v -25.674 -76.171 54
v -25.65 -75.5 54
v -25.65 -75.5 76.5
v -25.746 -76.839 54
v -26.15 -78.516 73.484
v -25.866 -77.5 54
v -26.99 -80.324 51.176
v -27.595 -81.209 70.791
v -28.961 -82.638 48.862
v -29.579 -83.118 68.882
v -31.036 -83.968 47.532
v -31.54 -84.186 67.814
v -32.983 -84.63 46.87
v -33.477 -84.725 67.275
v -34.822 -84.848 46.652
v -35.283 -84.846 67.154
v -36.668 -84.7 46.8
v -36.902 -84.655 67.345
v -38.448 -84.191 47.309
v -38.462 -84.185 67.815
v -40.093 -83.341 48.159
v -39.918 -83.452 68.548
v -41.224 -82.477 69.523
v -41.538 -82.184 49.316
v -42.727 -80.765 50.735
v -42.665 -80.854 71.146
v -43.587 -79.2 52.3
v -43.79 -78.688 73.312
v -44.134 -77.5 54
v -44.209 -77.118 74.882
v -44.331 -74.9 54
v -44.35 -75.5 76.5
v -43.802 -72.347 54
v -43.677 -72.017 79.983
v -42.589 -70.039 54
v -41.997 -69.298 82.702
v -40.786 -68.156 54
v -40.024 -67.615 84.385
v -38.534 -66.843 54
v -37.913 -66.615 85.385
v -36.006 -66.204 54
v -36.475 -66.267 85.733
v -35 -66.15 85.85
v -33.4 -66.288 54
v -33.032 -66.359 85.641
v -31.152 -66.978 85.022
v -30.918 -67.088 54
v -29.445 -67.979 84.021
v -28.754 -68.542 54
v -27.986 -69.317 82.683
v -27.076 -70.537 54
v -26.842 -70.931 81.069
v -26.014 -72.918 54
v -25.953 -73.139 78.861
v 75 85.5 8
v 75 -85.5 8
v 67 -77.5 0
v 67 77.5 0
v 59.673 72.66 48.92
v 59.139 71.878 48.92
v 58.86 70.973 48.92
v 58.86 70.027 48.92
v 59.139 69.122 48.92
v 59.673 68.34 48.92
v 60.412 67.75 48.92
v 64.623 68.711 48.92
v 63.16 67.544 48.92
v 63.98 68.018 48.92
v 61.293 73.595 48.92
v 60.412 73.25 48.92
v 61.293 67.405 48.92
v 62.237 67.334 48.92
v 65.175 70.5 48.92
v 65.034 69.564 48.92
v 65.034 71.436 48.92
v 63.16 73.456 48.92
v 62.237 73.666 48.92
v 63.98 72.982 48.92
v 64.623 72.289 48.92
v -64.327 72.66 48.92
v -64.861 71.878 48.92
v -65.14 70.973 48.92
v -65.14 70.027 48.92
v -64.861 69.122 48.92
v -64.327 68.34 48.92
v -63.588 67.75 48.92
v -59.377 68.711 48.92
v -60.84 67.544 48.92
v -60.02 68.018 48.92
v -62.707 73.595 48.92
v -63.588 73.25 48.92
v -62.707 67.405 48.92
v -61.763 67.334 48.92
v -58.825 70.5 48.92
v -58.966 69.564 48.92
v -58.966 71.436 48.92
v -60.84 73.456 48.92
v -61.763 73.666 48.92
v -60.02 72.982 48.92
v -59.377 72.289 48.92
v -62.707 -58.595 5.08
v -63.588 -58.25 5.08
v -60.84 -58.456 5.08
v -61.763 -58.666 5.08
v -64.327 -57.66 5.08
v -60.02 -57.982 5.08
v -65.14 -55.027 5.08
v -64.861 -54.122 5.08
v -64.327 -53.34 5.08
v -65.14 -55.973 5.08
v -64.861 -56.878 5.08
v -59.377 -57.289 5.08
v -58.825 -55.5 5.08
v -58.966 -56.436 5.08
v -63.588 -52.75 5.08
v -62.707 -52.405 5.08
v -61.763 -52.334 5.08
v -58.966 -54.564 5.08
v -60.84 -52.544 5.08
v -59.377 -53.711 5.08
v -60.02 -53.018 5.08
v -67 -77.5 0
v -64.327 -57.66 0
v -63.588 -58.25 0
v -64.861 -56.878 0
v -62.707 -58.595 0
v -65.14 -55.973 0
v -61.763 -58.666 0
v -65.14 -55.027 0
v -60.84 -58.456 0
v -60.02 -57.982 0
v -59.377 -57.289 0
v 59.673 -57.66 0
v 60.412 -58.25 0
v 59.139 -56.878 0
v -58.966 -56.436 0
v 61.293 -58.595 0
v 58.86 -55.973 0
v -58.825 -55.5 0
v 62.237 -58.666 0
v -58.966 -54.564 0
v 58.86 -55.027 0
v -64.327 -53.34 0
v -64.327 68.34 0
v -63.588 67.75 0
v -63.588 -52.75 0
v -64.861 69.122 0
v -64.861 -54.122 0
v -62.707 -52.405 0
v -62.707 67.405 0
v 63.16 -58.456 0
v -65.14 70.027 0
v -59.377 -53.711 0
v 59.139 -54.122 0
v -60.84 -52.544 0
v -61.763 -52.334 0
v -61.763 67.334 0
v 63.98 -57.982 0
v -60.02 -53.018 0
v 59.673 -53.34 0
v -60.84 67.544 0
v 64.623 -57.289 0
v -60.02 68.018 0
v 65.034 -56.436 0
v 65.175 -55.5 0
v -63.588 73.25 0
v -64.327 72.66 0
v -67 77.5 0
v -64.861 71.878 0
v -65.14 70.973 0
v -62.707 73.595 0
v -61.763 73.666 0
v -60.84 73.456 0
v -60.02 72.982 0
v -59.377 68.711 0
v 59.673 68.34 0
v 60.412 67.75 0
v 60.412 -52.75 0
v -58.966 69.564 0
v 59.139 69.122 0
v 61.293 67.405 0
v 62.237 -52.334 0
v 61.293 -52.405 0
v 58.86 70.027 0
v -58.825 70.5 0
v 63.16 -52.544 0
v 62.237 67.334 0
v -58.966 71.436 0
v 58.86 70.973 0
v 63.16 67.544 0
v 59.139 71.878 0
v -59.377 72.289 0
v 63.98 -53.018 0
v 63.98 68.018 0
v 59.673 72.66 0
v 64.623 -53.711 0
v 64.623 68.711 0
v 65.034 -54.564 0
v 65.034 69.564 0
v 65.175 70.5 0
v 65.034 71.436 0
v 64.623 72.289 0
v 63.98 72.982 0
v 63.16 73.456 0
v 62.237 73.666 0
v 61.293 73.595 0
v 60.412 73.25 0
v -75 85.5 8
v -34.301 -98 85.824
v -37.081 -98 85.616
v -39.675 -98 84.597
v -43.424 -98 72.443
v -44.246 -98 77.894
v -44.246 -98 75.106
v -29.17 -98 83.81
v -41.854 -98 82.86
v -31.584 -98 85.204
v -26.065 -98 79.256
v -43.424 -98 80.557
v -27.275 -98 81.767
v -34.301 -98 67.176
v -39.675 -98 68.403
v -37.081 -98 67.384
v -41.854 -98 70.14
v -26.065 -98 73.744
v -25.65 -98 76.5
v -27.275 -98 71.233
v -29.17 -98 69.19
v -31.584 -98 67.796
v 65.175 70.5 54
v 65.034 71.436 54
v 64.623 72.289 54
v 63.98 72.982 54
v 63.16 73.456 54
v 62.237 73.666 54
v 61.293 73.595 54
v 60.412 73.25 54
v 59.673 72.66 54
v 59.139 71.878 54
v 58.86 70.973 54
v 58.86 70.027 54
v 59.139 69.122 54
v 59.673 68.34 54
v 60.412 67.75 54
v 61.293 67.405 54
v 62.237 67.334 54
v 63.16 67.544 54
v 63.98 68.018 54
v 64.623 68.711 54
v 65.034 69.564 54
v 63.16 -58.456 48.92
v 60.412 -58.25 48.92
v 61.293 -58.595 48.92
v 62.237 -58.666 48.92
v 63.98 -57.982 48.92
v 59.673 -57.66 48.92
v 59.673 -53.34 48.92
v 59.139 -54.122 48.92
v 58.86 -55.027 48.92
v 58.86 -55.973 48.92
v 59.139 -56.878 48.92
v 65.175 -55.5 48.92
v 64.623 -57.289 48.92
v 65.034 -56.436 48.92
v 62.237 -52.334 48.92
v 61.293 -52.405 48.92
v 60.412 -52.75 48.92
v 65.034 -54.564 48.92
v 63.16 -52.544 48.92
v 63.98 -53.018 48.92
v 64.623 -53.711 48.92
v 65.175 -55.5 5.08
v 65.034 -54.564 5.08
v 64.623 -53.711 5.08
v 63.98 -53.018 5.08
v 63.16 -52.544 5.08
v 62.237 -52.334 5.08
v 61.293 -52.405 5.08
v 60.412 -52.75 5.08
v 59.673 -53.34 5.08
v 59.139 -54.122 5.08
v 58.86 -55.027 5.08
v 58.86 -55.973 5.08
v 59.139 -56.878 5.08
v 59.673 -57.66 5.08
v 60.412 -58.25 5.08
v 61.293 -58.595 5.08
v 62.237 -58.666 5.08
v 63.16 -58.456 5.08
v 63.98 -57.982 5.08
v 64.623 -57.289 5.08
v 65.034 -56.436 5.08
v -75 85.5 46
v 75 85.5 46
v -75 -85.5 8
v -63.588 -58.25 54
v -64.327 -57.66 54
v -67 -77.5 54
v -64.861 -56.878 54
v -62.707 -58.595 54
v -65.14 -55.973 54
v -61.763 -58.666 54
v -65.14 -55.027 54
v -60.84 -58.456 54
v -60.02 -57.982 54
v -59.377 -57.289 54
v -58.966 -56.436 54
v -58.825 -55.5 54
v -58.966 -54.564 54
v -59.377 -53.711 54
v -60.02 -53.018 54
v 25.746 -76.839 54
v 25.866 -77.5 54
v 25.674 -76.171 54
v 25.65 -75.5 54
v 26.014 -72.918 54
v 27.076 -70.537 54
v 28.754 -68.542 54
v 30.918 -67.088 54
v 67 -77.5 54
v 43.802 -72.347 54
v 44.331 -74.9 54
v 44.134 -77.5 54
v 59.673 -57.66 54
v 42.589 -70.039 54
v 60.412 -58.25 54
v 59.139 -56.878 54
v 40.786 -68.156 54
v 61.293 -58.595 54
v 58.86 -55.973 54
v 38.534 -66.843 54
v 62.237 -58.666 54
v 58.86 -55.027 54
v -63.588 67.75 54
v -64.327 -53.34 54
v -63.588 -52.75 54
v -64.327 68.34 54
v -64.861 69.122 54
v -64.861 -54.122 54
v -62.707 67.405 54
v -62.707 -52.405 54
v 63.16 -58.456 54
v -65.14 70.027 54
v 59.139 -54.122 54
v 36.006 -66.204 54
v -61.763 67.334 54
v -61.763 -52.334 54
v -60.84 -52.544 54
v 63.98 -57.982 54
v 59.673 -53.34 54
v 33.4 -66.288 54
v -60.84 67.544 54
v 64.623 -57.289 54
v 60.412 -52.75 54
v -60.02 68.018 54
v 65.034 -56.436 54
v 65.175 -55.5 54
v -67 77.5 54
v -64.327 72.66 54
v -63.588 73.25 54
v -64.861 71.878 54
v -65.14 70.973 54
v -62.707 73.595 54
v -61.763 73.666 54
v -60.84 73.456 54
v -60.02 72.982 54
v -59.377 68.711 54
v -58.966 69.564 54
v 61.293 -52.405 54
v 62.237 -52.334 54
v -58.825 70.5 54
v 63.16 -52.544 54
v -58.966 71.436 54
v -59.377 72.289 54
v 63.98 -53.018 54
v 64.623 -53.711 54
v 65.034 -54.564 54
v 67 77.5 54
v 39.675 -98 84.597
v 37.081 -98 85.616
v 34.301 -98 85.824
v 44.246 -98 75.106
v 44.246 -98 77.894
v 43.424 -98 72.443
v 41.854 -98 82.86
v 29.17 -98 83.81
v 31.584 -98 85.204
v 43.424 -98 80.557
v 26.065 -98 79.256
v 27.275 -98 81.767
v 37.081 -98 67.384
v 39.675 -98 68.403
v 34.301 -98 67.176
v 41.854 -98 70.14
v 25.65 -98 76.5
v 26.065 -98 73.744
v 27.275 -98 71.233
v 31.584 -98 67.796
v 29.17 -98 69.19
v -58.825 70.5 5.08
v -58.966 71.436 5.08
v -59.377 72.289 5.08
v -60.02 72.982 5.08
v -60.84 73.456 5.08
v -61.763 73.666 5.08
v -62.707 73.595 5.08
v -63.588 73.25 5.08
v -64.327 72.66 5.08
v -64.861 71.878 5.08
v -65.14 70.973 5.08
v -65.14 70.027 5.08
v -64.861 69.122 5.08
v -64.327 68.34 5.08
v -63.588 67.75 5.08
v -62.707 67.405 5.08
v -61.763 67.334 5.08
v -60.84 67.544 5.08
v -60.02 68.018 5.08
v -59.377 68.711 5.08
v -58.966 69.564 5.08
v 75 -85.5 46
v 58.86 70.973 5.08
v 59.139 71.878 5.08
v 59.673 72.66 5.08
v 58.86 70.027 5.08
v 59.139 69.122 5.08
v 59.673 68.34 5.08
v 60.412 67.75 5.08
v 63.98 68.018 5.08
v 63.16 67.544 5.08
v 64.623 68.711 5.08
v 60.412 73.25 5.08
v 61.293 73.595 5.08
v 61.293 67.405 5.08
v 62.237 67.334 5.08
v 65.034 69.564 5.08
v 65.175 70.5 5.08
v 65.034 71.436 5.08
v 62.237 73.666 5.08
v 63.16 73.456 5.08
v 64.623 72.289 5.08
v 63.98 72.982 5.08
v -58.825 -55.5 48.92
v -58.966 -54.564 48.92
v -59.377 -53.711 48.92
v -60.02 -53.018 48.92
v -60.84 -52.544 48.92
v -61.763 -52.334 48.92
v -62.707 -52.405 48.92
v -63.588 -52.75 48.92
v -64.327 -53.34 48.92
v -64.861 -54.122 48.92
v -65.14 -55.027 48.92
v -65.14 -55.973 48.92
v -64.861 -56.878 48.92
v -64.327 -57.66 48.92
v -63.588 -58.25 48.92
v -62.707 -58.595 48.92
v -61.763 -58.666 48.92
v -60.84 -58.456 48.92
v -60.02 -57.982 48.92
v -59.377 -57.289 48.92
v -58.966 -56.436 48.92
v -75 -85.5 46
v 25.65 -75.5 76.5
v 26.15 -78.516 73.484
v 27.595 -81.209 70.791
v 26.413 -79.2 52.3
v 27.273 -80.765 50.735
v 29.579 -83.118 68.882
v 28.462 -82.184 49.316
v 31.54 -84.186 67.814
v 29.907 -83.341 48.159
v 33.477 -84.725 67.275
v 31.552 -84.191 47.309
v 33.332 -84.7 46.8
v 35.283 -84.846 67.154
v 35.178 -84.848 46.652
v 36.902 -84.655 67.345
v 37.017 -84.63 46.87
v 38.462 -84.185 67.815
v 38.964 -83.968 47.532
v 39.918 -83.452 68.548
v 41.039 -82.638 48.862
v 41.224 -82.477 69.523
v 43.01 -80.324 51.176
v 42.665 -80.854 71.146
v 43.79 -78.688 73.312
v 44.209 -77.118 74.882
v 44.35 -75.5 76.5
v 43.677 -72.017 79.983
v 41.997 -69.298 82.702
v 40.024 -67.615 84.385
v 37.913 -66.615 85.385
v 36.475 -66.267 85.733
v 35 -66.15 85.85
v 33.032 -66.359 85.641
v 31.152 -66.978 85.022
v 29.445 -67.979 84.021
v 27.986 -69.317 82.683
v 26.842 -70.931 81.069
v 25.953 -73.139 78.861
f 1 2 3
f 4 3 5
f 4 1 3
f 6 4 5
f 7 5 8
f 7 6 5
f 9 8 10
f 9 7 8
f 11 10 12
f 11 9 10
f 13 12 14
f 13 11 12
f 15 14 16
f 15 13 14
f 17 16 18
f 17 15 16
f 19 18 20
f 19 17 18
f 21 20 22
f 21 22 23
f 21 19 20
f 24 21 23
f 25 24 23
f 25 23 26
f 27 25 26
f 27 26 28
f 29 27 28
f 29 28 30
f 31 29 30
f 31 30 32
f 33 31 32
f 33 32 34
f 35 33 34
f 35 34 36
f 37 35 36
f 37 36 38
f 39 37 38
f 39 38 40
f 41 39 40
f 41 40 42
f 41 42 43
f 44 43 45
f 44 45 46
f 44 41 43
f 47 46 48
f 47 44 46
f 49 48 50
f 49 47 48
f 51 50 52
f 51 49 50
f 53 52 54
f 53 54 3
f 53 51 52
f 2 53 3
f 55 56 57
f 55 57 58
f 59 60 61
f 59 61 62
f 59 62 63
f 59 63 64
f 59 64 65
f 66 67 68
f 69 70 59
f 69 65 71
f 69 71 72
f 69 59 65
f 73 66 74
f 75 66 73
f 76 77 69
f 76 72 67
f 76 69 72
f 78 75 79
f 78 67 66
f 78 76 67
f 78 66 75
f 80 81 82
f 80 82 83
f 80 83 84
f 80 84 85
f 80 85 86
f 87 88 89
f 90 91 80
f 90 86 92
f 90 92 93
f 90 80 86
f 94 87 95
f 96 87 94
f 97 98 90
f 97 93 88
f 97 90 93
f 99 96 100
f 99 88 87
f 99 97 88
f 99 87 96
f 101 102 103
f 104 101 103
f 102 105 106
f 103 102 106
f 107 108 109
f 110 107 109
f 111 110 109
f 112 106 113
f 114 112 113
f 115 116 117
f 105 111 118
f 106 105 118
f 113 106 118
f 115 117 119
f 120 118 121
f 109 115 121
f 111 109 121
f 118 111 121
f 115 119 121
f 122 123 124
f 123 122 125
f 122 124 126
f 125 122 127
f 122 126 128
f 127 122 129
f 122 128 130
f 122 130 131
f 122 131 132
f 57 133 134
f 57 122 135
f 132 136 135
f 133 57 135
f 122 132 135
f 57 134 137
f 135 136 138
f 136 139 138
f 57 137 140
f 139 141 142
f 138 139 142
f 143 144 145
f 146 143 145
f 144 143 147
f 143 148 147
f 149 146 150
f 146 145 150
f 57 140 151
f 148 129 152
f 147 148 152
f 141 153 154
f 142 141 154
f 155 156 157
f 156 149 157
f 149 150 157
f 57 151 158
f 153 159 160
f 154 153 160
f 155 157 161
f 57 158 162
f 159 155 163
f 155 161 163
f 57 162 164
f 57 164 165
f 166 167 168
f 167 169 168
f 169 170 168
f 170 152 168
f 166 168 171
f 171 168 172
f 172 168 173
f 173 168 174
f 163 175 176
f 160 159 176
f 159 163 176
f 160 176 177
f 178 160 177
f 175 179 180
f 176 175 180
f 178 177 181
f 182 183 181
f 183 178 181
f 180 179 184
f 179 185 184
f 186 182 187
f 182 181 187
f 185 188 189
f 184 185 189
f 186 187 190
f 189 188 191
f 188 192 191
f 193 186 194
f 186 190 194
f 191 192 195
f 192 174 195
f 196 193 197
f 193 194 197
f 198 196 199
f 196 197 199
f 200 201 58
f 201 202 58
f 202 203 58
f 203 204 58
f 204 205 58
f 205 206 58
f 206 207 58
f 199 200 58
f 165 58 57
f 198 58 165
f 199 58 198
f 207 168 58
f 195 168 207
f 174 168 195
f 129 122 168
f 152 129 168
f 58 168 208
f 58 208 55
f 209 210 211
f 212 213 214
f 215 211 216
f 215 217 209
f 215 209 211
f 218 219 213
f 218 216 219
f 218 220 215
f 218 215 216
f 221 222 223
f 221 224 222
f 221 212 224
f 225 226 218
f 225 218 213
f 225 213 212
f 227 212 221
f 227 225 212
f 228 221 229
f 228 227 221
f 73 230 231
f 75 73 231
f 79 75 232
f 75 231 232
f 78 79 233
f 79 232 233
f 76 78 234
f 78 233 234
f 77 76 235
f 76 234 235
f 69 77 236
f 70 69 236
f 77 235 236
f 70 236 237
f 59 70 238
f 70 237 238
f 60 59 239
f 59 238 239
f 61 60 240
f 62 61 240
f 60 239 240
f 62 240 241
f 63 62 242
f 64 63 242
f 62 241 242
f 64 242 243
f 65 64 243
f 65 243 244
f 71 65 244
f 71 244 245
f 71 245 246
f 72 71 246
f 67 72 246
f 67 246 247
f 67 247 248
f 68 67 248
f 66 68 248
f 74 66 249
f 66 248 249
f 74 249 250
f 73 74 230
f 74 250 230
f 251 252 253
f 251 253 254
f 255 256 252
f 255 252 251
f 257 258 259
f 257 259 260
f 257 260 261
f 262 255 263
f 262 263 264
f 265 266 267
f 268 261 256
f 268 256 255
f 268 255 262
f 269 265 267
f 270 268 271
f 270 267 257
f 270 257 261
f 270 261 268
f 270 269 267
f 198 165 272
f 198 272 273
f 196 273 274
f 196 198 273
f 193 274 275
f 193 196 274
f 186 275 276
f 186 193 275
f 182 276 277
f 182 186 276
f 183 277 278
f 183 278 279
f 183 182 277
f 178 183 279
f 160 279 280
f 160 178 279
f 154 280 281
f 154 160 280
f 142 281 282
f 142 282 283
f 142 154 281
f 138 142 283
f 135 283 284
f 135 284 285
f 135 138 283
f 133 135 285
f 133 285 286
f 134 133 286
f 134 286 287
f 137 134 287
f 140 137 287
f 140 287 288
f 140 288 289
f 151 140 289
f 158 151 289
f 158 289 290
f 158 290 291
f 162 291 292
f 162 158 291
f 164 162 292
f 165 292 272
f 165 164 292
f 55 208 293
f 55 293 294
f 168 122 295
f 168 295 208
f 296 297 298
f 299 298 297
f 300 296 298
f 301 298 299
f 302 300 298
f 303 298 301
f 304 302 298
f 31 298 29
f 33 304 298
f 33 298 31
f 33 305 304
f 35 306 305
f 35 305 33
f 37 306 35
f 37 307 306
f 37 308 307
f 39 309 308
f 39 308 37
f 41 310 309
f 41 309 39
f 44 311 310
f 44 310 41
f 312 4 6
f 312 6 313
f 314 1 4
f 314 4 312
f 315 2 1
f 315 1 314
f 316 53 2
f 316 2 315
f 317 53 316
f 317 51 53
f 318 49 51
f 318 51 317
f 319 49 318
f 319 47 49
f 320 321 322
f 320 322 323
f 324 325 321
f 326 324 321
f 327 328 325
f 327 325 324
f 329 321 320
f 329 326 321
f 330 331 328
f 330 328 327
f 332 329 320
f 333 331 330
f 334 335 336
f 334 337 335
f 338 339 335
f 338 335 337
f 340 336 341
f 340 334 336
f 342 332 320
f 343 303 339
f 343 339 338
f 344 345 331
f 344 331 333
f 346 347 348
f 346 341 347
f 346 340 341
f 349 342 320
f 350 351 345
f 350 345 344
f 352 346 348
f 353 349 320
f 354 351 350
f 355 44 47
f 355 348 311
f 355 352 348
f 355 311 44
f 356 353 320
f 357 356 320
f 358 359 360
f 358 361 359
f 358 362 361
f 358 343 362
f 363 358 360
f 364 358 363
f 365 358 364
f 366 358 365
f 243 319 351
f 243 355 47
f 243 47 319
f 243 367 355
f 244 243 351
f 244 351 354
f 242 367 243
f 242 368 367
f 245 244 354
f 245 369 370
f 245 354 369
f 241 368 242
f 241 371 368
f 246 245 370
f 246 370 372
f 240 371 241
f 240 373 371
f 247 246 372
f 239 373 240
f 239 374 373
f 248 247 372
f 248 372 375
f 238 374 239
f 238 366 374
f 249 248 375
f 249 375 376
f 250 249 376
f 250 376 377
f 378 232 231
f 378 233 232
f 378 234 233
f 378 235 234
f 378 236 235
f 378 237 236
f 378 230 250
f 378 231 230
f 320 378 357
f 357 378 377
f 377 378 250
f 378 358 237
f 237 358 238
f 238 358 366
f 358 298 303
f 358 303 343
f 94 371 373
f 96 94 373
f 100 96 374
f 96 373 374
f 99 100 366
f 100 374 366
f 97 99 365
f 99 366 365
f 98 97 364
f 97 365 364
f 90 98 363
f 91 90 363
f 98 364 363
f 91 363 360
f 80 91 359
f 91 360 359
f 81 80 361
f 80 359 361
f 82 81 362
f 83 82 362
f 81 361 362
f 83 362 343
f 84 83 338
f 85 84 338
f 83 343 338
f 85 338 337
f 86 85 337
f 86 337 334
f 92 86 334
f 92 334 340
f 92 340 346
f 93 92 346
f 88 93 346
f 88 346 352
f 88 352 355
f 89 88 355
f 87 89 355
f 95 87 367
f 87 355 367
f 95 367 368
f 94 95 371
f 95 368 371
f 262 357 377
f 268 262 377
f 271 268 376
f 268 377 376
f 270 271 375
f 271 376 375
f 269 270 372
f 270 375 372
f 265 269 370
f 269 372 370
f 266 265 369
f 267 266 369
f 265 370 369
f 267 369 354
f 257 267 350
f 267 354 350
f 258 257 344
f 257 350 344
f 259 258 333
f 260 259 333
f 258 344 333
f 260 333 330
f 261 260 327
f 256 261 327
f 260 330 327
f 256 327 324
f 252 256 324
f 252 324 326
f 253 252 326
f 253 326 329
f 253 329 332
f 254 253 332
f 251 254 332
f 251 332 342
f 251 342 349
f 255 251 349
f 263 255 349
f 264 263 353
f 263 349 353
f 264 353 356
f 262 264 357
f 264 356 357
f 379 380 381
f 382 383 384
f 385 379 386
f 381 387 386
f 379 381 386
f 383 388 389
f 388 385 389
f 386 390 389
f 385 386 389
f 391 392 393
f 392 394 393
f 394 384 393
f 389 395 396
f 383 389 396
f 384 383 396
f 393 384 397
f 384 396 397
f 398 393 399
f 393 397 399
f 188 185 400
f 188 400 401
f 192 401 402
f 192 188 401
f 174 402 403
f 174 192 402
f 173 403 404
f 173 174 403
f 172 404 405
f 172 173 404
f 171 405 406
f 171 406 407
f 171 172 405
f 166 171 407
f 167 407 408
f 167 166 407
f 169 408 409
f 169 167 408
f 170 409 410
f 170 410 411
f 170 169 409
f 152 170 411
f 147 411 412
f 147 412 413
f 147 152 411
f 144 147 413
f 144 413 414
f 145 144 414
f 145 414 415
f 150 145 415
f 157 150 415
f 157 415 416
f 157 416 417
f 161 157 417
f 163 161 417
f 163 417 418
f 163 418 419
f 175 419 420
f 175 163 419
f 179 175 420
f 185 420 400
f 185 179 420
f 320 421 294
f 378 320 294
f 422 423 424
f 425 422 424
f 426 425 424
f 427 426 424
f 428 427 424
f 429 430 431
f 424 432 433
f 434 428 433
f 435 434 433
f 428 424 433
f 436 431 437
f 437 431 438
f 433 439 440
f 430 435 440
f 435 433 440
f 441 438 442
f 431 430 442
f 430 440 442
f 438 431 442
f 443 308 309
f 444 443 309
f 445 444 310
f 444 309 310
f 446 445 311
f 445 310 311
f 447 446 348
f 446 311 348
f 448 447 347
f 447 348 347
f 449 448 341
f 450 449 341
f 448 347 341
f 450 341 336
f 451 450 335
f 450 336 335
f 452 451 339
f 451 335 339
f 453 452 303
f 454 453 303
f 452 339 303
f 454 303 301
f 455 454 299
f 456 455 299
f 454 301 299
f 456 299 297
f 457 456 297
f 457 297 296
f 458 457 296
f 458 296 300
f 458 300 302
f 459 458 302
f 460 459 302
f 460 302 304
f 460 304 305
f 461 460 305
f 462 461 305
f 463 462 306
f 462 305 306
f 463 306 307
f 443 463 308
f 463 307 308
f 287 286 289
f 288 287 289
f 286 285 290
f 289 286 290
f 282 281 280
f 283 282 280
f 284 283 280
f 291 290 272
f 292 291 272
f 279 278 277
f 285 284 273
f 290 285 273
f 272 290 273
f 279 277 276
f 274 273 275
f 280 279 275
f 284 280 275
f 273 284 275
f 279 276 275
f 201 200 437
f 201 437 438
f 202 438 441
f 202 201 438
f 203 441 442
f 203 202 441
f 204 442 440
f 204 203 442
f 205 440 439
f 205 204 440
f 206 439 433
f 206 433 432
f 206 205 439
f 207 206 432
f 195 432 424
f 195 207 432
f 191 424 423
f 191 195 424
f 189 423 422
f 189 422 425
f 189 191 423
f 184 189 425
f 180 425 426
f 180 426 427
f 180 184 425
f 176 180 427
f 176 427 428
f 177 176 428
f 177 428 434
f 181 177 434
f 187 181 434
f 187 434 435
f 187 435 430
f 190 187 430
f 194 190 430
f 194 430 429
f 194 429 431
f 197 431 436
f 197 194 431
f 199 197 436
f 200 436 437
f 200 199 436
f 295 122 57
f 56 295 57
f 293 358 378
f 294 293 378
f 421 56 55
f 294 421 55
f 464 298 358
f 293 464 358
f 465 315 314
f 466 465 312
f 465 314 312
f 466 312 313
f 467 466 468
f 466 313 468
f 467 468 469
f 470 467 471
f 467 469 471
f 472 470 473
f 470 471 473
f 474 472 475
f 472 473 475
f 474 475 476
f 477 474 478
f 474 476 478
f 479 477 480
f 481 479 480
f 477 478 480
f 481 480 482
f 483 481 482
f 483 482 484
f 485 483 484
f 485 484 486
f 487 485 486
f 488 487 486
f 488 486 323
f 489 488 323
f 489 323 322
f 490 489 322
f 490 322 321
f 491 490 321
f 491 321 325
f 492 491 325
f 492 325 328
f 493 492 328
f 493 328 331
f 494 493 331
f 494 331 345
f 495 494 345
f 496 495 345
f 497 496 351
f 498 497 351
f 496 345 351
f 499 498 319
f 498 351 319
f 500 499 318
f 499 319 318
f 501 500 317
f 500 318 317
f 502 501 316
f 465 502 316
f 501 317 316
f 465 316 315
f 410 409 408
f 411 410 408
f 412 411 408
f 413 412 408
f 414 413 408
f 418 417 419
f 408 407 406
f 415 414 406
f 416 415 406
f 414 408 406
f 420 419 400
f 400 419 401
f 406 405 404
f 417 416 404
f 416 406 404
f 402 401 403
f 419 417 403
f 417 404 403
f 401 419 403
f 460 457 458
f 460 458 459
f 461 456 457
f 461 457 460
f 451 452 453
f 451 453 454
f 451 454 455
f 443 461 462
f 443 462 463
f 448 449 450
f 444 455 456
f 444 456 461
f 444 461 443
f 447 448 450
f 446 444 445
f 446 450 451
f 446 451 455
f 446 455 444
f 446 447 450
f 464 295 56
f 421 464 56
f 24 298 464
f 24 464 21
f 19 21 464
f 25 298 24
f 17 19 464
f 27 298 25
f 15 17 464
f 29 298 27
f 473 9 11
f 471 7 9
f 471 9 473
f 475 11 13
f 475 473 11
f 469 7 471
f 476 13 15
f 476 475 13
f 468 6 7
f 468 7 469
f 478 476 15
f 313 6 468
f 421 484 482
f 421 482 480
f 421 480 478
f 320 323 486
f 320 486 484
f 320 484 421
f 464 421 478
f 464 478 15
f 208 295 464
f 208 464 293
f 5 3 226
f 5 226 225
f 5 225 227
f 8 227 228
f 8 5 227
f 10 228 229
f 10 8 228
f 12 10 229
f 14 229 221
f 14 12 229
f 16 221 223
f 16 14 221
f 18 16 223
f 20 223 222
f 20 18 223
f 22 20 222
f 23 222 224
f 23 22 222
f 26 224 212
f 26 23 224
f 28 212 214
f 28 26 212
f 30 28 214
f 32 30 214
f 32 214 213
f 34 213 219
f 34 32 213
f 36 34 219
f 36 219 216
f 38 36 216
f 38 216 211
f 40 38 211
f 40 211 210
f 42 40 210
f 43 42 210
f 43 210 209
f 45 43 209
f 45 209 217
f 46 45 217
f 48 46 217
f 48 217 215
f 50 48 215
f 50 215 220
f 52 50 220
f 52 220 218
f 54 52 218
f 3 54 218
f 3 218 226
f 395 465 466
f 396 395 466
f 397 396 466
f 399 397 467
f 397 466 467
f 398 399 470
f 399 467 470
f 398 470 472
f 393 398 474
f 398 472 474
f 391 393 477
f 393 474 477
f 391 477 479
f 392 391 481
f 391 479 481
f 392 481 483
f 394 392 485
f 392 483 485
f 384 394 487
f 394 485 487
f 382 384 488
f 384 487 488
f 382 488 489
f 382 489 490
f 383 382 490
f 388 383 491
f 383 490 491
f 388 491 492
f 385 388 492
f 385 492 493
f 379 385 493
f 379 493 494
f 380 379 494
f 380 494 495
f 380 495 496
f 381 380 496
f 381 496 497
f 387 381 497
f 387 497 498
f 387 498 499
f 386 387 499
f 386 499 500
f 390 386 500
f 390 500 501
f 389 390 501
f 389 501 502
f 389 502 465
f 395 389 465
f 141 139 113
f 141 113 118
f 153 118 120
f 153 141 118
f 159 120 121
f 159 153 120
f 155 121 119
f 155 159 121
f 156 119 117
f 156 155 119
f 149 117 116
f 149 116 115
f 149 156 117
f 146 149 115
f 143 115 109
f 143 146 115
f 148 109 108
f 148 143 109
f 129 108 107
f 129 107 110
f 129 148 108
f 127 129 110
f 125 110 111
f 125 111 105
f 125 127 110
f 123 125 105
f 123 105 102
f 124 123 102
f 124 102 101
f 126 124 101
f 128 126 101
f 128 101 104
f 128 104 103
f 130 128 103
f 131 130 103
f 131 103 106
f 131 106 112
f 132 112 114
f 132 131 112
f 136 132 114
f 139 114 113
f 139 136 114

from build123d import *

# Parameters (mm, degrees)
SKETCH1_W           = 150
SKETCH1_H           = 171
BOSS_EXTRUDE1_DEPTH = 54
SKETCH2_R           = 3.175
CUT_EXTRUDE1_DEPTH  = 5.08
CHAMFER1_SIZE       = 8
SKETCH5_R           = 9.35


with BuildPart() as part:
    # Sketch1 → Boss-Extrude1 (new body)
    with BuildSketch(Plane.XY):
        Rectangle(SKETCH1_W, SKETCH1_H)
    extrude(amount=BOSS_EXTRUDE1_DEPTH)

    # Sketch2 → Cut-Extrude1 (cut)
    with BuildSketch(Plane.XY.offset(54)):
        with Locations((-62, 70.5)):
            Circle(SKETCH2_R)
        with Locations((62, 70.5)):
            Circle(SKETCH2_R)
        with Locations((62, -55.5)):
            Circle(SKETCH2_R)
        with Locations((-62, -55.5)):
            Circle(SKETCH2_R)
    cut_extrude1 = extrude(amount=-CUT_EXTRUDE1_DEPTH, mode=Mode.SUBTRACT)

    # Mirror1: Cut-Extrude1 across plane
    add(cut_extrude1.mirror(Plane.XY.offset(27)), mode=Mode.SUBTRACT)

    # Chamfer1
    chamfer1_edges = [part.edges().sort_by_distance(p)[0] for p in [
        (75, 0, 54),
        (0, -85.5, 54),
        (-75, 0, 54),
        (0, -85.5, 0),
        (75, 0, 0),
        (0, 85.5, 0),
        (-75, 0, 0),
        (0, 85.5, 54),
    ]]
    chamfer(chamfer1_edges, length=CHAMFER1_SIZE)

    # Sweep1: sweep along a path in Sketch6
    with BuildLine(Plane.ZY.offset(35)) as sweep1_path:
        Line((76.5, -98), (76.5, -75.5))
        Line((76.5, -75.5), (54, -75.5))
        Line((54, -75.5), (44, -75.5))
    # Sketch5 → Sweep1 (sweep)
    with BuildSketch(Plane.XY.offset(54)):
        with Locations((-35, -75.5)):
            Circle(SKETCH5_R)
    sweep1 = sweep(path=sweep1_path.line, transition=Transition.RIGHT)

    # Mirror2: Sweep1 across plane
    add(sweep1.mirror(Plane.ZY))


solid = part.part
